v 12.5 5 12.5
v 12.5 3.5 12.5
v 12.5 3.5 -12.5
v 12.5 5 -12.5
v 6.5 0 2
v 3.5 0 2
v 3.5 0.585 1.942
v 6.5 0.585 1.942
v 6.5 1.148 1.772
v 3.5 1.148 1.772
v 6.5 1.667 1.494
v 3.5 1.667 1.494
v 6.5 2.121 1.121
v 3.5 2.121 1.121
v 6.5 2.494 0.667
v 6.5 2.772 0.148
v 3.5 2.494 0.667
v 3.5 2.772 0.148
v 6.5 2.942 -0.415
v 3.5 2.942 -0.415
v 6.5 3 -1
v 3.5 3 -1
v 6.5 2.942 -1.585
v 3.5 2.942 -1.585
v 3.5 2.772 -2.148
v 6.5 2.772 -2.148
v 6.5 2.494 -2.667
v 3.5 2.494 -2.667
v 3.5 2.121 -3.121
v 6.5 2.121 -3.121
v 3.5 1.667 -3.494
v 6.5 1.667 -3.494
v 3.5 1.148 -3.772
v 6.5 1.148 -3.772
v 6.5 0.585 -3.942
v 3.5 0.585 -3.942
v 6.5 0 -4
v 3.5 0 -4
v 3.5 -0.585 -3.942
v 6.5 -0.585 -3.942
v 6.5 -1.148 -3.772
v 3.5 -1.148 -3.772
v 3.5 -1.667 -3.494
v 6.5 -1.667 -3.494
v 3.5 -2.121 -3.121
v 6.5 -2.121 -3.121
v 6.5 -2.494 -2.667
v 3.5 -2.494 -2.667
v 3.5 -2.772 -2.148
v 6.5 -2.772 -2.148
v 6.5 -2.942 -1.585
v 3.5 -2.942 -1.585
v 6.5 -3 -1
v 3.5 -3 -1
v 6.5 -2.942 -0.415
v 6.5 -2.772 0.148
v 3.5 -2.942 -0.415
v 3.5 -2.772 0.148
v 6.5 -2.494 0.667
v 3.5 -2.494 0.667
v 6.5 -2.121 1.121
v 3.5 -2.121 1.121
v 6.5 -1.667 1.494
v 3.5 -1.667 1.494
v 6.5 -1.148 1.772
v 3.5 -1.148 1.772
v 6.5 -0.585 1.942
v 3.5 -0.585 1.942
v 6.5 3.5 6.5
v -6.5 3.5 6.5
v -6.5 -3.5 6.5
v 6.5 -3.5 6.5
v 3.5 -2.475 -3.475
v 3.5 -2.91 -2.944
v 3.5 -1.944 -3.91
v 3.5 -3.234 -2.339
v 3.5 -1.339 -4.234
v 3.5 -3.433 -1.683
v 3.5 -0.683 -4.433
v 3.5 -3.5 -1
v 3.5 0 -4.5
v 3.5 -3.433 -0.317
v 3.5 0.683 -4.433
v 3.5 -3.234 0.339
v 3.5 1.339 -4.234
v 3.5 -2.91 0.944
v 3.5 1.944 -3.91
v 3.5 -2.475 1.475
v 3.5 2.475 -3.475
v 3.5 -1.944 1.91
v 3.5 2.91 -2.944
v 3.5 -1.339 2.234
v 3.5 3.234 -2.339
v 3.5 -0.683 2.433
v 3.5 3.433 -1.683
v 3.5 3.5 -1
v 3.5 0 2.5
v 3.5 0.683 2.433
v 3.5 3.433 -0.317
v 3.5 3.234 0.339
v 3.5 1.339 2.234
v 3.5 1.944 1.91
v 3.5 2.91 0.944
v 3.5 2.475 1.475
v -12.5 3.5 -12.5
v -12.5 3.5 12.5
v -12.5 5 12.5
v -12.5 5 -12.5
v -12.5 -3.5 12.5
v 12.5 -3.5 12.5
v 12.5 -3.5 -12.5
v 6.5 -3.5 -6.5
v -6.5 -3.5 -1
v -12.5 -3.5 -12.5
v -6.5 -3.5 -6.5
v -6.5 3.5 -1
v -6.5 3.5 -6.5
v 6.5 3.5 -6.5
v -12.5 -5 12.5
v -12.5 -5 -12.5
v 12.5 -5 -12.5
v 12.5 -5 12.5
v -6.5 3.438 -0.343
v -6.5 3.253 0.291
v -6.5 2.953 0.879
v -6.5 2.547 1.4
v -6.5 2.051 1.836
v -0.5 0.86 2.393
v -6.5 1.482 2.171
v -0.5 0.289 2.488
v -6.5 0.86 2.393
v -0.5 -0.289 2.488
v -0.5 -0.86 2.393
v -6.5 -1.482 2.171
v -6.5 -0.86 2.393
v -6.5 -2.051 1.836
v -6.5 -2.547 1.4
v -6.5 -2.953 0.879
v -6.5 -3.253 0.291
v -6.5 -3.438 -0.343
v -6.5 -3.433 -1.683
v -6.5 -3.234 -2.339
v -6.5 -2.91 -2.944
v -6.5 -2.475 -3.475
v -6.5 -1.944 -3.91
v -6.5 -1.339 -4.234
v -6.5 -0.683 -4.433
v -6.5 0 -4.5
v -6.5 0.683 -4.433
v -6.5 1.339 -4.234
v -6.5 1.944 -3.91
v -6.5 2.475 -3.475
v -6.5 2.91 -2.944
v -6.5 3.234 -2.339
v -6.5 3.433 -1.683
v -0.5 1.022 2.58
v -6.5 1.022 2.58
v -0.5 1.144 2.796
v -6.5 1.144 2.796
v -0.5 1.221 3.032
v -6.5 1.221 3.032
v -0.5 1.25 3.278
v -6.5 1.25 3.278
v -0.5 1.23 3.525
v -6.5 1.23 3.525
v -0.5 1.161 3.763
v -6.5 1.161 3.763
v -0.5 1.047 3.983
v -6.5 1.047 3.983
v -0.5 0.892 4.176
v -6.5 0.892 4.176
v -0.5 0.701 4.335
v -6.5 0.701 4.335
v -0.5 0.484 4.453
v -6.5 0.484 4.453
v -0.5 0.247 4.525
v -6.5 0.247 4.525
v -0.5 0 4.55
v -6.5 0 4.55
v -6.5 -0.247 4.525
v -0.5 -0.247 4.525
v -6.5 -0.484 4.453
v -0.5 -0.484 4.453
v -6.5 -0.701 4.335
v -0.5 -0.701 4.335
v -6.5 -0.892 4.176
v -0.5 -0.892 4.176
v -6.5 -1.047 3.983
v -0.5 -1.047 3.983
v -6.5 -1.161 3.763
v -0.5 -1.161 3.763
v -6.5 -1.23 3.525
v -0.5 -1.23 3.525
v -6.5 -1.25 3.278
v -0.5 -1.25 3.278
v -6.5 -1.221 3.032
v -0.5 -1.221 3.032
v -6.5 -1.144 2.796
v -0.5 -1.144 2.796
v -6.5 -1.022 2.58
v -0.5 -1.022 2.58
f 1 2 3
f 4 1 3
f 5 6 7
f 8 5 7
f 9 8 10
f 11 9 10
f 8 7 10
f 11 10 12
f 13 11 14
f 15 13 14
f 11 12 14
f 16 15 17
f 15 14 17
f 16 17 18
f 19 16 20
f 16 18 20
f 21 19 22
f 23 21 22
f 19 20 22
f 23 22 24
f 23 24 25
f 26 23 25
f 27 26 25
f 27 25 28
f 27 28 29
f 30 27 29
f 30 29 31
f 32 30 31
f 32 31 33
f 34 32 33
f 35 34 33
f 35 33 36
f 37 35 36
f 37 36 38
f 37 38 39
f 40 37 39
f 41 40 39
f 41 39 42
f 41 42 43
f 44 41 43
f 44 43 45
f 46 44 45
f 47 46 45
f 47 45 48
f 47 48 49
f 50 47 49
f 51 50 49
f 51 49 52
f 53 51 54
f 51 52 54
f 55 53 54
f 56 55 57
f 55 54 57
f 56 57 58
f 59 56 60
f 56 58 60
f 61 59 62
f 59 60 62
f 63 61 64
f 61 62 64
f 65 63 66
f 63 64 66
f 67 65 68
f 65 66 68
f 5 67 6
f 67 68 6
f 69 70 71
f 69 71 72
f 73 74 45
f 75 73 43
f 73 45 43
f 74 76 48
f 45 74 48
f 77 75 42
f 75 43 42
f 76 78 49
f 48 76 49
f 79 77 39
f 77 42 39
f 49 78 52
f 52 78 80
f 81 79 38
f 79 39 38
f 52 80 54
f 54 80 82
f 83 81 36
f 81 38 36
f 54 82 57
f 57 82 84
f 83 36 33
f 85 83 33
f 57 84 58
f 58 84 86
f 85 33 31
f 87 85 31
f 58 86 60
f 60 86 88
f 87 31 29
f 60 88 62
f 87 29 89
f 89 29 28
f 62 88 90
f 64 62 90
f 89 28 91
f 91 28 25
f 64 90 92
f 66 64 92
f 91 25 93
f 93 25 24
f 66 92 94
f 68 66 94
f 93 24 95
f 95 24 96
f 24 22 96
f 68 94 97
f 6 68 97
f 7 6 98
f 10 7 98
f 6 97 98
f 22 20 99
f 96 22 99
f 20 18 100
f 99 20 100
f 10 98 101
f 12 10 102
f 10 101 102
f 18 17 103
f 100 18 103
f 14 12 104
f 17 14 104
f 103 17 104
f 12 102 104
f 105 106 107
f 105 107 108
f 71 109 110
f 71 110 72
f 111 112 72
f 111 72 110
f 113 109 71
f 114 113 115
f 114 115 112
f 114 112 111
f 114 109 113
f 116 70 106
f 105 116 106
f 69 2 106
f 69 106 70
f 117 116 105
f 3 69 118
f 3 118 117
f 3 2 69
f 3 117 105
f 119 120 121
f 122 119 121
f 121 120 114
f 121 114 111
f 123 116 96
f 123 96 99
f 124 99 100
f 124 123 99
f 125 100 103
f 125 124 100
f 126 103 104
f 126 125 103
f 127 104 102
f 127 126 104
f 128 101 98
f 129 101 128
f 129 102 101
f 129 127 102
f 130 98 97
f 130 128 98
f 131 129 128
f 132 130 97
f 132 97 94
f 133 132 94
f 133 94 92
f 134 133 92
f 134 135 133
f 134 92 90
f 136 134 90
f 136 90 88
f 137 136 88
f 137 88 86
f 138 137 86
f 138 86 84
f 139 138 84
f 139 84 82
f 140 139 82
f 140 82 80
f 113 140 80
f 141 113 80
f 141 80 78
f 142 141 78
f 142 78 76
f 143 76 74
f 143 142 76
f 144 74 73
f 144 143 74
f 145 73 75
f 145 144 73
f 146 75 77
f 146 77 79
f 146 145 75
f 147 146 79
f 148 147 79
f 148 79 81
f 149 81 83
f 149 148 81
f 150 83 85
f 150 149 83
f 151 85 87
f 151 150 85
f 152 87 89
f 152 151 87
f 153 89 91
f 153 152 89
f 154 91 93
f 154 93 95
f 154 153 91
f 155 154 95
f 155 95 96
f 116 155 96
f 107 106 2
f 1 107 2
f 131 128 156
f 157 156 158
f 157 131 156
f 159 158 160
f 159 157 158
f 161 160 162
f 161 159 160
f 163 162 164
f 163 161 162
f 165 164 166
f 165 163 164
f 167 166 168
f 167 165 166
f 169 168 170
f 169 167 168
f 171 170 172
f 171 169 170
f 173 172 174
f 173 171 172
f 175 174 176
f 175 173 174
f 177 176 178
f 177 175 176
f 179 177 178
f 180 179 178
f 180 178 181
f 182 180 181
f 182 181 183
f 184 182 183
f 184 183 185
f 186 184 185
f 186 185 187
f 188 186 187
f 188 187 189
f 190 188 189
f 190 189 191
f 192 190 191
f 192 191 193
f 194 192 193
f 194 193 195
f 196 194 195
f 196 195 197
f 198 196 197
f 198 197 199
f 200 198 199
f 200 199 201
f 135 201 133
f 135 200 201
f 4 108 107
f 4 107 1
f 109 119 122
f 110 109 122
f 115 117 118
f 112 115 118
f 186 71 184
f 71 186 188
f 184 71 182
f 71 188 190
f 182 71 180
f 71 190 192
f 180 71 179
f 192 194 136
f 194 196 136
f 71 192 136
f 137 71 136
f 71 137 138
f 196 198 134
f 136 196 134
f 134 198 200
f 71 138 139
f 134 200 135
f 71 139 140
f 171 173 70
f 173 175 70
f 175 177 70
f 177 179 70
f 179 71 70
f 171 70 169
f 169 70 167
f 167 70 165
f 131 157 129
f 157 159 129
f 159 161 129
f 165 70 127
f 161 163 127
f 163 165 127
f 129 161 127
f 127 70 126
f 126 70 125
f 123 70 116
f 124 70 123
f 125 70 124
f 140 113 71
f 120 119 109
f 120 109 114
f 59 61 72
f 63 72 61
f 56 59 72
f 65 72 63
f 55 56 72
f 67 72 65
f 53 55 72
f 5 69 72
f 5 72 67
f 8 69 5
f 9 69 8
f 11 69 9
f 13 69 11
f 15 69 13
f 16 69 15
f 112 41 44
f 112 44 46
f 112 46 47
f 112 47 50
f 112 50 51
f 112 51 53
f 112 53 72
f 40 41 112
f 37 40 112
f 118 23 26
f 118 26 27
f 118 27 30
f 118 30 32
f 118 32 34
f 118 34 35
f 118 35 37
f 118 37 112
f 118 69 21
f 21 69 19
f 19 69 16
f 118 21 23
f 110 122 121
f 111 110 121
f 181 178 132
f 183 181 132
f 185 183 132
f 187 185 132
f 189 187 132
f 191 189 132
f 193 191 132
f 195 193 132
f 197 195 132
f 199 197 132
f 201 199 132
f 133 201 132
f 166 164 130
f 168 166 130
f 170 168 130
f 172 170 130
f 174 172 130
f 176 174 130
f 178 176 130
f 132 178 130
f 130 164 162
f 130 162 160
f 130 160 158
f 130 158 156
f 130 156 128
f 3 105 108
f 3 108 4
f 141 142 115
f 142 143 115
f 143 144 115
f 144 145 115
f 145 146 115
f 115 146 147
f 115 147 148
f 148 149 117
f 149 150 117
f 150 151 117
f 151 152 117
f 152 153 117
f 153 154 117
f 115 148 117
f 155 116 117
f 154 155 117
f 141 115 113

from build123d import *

# Parameters (mm, degrees)
EXTRUDE_1_DEPTH      = 5
EXTRUDE_1_DEPTH_BACK = 5
SKETCH_1_W           = 25
SKETCH_1_H           = 25
SKETCH_8_W           = 25
SKETCH_8_H           = 7
CUT_EXTRUDE_8_DEPTH  = 6
SKETCH_9_W           = 25
SKETCH_9_H           = 7
CUT_EXTRUDE_9_DEPTH  = 6
SKETCH_2_R           = 3.5
CUT_EXTRUDE_1_DEPTH  = 10
SKETCH_4_R           = 1.25
CUT_EXTRUDE_3_DEPTH  = 6
SKETCH_7_R           = 3
CUT_EXTRUDE_7_DEPTH  = 21.910523666


with BuildPart() as part:
    # 草图1 → 拉伸1 (new, two sides: drawn at the far end of the back side and taken through both)
    with BuildSketch(Plane(origin=(0, 0, 0), x_dir=(1, 0, 0), z_dir=(0, 1, 0)).offset(-EXTRUDE_1_DEPTH_BACK)):
        Rectangle(SKETCH_1_W, SKETCH_1_H)
    extrude(amount=EXTRUDE_1_DEPTH + EXTRUDE_1_DEPTH_BACK)

    # 草图8 → 切除-拉伸8 (cut)
    with BuildSketch(Plane(origin=(-12.5, 0, 0), x_dir=(0, 0, -1), z_dir=(1, 0, 0))):
        Rectangle(SKETCH_8_W, SKETCH_8_H)
    cut_extrude_8 = extrude(amount=CUT_EXTRUDE_8_DEPTH, mode=Mode.SUBTRACT)

    # 镜向1: 切除-拉伸8 across plane
    add(cut_extrude_8.mirror(Plane(origin=(0, 0, 0), x_dir=(0, 0, 1), z_dir=(1, 0, 0))), mode=Mode.SUBTRACT)

    # 草图9 → 切除-拉伸9 (cut)
    with BuildSketch(Plane.XY.offset(12.5)):
        Rectangle(SKETCH_9_W, SKETCH_9_H)
    cut_extrude_9 = extrude(amount=-CUT_EXTRUDE_9_DEPTH, mode=Mode.SUBTRACT)

    # 镜向2: 切除-拉伸9 across plane
    add(cut_extrude_9.mirror(Plane.XY), mode=Mode.SUBTRACT)

    # 草图2 → 切除-拉伸1 (cut)
    with BuildSketch(Plane(origin=(-6.5, 0, 0), x_dir=(0, 0, -1), z_dir=(1, 0, 0))):
        with Locations((1, 0)):
            Circle(SKETCH_2_R)
    extrude(amount=CUT_EXTRUDE_1_DEPTH, mode=Mode.SUBTRACT)

    # 草图4 → 切除-拉伸3 (cut)
    with BuildSketch(Plane(origin=(-6.5, 0, 0), x_dir=(0, 0, -1), z_dir=(1, 0, 0))):
        with Locations((-3.3, 0)):
            Circle(SKETCH_4_R)
    extrude(amount=CUT_EXTRUDE_3_DEPTH, mode=Mode.SUBTRACT)

    # 草图7 → 切除-拉伸7 (cut, through all)
    with BuildSketch(Plane.ZY.offset(-3.5)):
        with Locations((-1, 0)):
            Circle(SKETCH_7_R)
    extrude(amount=-CUT_EXTRUDE_7_DEPTH, mode=Mode.SUBTRACT)


solid = part.part
